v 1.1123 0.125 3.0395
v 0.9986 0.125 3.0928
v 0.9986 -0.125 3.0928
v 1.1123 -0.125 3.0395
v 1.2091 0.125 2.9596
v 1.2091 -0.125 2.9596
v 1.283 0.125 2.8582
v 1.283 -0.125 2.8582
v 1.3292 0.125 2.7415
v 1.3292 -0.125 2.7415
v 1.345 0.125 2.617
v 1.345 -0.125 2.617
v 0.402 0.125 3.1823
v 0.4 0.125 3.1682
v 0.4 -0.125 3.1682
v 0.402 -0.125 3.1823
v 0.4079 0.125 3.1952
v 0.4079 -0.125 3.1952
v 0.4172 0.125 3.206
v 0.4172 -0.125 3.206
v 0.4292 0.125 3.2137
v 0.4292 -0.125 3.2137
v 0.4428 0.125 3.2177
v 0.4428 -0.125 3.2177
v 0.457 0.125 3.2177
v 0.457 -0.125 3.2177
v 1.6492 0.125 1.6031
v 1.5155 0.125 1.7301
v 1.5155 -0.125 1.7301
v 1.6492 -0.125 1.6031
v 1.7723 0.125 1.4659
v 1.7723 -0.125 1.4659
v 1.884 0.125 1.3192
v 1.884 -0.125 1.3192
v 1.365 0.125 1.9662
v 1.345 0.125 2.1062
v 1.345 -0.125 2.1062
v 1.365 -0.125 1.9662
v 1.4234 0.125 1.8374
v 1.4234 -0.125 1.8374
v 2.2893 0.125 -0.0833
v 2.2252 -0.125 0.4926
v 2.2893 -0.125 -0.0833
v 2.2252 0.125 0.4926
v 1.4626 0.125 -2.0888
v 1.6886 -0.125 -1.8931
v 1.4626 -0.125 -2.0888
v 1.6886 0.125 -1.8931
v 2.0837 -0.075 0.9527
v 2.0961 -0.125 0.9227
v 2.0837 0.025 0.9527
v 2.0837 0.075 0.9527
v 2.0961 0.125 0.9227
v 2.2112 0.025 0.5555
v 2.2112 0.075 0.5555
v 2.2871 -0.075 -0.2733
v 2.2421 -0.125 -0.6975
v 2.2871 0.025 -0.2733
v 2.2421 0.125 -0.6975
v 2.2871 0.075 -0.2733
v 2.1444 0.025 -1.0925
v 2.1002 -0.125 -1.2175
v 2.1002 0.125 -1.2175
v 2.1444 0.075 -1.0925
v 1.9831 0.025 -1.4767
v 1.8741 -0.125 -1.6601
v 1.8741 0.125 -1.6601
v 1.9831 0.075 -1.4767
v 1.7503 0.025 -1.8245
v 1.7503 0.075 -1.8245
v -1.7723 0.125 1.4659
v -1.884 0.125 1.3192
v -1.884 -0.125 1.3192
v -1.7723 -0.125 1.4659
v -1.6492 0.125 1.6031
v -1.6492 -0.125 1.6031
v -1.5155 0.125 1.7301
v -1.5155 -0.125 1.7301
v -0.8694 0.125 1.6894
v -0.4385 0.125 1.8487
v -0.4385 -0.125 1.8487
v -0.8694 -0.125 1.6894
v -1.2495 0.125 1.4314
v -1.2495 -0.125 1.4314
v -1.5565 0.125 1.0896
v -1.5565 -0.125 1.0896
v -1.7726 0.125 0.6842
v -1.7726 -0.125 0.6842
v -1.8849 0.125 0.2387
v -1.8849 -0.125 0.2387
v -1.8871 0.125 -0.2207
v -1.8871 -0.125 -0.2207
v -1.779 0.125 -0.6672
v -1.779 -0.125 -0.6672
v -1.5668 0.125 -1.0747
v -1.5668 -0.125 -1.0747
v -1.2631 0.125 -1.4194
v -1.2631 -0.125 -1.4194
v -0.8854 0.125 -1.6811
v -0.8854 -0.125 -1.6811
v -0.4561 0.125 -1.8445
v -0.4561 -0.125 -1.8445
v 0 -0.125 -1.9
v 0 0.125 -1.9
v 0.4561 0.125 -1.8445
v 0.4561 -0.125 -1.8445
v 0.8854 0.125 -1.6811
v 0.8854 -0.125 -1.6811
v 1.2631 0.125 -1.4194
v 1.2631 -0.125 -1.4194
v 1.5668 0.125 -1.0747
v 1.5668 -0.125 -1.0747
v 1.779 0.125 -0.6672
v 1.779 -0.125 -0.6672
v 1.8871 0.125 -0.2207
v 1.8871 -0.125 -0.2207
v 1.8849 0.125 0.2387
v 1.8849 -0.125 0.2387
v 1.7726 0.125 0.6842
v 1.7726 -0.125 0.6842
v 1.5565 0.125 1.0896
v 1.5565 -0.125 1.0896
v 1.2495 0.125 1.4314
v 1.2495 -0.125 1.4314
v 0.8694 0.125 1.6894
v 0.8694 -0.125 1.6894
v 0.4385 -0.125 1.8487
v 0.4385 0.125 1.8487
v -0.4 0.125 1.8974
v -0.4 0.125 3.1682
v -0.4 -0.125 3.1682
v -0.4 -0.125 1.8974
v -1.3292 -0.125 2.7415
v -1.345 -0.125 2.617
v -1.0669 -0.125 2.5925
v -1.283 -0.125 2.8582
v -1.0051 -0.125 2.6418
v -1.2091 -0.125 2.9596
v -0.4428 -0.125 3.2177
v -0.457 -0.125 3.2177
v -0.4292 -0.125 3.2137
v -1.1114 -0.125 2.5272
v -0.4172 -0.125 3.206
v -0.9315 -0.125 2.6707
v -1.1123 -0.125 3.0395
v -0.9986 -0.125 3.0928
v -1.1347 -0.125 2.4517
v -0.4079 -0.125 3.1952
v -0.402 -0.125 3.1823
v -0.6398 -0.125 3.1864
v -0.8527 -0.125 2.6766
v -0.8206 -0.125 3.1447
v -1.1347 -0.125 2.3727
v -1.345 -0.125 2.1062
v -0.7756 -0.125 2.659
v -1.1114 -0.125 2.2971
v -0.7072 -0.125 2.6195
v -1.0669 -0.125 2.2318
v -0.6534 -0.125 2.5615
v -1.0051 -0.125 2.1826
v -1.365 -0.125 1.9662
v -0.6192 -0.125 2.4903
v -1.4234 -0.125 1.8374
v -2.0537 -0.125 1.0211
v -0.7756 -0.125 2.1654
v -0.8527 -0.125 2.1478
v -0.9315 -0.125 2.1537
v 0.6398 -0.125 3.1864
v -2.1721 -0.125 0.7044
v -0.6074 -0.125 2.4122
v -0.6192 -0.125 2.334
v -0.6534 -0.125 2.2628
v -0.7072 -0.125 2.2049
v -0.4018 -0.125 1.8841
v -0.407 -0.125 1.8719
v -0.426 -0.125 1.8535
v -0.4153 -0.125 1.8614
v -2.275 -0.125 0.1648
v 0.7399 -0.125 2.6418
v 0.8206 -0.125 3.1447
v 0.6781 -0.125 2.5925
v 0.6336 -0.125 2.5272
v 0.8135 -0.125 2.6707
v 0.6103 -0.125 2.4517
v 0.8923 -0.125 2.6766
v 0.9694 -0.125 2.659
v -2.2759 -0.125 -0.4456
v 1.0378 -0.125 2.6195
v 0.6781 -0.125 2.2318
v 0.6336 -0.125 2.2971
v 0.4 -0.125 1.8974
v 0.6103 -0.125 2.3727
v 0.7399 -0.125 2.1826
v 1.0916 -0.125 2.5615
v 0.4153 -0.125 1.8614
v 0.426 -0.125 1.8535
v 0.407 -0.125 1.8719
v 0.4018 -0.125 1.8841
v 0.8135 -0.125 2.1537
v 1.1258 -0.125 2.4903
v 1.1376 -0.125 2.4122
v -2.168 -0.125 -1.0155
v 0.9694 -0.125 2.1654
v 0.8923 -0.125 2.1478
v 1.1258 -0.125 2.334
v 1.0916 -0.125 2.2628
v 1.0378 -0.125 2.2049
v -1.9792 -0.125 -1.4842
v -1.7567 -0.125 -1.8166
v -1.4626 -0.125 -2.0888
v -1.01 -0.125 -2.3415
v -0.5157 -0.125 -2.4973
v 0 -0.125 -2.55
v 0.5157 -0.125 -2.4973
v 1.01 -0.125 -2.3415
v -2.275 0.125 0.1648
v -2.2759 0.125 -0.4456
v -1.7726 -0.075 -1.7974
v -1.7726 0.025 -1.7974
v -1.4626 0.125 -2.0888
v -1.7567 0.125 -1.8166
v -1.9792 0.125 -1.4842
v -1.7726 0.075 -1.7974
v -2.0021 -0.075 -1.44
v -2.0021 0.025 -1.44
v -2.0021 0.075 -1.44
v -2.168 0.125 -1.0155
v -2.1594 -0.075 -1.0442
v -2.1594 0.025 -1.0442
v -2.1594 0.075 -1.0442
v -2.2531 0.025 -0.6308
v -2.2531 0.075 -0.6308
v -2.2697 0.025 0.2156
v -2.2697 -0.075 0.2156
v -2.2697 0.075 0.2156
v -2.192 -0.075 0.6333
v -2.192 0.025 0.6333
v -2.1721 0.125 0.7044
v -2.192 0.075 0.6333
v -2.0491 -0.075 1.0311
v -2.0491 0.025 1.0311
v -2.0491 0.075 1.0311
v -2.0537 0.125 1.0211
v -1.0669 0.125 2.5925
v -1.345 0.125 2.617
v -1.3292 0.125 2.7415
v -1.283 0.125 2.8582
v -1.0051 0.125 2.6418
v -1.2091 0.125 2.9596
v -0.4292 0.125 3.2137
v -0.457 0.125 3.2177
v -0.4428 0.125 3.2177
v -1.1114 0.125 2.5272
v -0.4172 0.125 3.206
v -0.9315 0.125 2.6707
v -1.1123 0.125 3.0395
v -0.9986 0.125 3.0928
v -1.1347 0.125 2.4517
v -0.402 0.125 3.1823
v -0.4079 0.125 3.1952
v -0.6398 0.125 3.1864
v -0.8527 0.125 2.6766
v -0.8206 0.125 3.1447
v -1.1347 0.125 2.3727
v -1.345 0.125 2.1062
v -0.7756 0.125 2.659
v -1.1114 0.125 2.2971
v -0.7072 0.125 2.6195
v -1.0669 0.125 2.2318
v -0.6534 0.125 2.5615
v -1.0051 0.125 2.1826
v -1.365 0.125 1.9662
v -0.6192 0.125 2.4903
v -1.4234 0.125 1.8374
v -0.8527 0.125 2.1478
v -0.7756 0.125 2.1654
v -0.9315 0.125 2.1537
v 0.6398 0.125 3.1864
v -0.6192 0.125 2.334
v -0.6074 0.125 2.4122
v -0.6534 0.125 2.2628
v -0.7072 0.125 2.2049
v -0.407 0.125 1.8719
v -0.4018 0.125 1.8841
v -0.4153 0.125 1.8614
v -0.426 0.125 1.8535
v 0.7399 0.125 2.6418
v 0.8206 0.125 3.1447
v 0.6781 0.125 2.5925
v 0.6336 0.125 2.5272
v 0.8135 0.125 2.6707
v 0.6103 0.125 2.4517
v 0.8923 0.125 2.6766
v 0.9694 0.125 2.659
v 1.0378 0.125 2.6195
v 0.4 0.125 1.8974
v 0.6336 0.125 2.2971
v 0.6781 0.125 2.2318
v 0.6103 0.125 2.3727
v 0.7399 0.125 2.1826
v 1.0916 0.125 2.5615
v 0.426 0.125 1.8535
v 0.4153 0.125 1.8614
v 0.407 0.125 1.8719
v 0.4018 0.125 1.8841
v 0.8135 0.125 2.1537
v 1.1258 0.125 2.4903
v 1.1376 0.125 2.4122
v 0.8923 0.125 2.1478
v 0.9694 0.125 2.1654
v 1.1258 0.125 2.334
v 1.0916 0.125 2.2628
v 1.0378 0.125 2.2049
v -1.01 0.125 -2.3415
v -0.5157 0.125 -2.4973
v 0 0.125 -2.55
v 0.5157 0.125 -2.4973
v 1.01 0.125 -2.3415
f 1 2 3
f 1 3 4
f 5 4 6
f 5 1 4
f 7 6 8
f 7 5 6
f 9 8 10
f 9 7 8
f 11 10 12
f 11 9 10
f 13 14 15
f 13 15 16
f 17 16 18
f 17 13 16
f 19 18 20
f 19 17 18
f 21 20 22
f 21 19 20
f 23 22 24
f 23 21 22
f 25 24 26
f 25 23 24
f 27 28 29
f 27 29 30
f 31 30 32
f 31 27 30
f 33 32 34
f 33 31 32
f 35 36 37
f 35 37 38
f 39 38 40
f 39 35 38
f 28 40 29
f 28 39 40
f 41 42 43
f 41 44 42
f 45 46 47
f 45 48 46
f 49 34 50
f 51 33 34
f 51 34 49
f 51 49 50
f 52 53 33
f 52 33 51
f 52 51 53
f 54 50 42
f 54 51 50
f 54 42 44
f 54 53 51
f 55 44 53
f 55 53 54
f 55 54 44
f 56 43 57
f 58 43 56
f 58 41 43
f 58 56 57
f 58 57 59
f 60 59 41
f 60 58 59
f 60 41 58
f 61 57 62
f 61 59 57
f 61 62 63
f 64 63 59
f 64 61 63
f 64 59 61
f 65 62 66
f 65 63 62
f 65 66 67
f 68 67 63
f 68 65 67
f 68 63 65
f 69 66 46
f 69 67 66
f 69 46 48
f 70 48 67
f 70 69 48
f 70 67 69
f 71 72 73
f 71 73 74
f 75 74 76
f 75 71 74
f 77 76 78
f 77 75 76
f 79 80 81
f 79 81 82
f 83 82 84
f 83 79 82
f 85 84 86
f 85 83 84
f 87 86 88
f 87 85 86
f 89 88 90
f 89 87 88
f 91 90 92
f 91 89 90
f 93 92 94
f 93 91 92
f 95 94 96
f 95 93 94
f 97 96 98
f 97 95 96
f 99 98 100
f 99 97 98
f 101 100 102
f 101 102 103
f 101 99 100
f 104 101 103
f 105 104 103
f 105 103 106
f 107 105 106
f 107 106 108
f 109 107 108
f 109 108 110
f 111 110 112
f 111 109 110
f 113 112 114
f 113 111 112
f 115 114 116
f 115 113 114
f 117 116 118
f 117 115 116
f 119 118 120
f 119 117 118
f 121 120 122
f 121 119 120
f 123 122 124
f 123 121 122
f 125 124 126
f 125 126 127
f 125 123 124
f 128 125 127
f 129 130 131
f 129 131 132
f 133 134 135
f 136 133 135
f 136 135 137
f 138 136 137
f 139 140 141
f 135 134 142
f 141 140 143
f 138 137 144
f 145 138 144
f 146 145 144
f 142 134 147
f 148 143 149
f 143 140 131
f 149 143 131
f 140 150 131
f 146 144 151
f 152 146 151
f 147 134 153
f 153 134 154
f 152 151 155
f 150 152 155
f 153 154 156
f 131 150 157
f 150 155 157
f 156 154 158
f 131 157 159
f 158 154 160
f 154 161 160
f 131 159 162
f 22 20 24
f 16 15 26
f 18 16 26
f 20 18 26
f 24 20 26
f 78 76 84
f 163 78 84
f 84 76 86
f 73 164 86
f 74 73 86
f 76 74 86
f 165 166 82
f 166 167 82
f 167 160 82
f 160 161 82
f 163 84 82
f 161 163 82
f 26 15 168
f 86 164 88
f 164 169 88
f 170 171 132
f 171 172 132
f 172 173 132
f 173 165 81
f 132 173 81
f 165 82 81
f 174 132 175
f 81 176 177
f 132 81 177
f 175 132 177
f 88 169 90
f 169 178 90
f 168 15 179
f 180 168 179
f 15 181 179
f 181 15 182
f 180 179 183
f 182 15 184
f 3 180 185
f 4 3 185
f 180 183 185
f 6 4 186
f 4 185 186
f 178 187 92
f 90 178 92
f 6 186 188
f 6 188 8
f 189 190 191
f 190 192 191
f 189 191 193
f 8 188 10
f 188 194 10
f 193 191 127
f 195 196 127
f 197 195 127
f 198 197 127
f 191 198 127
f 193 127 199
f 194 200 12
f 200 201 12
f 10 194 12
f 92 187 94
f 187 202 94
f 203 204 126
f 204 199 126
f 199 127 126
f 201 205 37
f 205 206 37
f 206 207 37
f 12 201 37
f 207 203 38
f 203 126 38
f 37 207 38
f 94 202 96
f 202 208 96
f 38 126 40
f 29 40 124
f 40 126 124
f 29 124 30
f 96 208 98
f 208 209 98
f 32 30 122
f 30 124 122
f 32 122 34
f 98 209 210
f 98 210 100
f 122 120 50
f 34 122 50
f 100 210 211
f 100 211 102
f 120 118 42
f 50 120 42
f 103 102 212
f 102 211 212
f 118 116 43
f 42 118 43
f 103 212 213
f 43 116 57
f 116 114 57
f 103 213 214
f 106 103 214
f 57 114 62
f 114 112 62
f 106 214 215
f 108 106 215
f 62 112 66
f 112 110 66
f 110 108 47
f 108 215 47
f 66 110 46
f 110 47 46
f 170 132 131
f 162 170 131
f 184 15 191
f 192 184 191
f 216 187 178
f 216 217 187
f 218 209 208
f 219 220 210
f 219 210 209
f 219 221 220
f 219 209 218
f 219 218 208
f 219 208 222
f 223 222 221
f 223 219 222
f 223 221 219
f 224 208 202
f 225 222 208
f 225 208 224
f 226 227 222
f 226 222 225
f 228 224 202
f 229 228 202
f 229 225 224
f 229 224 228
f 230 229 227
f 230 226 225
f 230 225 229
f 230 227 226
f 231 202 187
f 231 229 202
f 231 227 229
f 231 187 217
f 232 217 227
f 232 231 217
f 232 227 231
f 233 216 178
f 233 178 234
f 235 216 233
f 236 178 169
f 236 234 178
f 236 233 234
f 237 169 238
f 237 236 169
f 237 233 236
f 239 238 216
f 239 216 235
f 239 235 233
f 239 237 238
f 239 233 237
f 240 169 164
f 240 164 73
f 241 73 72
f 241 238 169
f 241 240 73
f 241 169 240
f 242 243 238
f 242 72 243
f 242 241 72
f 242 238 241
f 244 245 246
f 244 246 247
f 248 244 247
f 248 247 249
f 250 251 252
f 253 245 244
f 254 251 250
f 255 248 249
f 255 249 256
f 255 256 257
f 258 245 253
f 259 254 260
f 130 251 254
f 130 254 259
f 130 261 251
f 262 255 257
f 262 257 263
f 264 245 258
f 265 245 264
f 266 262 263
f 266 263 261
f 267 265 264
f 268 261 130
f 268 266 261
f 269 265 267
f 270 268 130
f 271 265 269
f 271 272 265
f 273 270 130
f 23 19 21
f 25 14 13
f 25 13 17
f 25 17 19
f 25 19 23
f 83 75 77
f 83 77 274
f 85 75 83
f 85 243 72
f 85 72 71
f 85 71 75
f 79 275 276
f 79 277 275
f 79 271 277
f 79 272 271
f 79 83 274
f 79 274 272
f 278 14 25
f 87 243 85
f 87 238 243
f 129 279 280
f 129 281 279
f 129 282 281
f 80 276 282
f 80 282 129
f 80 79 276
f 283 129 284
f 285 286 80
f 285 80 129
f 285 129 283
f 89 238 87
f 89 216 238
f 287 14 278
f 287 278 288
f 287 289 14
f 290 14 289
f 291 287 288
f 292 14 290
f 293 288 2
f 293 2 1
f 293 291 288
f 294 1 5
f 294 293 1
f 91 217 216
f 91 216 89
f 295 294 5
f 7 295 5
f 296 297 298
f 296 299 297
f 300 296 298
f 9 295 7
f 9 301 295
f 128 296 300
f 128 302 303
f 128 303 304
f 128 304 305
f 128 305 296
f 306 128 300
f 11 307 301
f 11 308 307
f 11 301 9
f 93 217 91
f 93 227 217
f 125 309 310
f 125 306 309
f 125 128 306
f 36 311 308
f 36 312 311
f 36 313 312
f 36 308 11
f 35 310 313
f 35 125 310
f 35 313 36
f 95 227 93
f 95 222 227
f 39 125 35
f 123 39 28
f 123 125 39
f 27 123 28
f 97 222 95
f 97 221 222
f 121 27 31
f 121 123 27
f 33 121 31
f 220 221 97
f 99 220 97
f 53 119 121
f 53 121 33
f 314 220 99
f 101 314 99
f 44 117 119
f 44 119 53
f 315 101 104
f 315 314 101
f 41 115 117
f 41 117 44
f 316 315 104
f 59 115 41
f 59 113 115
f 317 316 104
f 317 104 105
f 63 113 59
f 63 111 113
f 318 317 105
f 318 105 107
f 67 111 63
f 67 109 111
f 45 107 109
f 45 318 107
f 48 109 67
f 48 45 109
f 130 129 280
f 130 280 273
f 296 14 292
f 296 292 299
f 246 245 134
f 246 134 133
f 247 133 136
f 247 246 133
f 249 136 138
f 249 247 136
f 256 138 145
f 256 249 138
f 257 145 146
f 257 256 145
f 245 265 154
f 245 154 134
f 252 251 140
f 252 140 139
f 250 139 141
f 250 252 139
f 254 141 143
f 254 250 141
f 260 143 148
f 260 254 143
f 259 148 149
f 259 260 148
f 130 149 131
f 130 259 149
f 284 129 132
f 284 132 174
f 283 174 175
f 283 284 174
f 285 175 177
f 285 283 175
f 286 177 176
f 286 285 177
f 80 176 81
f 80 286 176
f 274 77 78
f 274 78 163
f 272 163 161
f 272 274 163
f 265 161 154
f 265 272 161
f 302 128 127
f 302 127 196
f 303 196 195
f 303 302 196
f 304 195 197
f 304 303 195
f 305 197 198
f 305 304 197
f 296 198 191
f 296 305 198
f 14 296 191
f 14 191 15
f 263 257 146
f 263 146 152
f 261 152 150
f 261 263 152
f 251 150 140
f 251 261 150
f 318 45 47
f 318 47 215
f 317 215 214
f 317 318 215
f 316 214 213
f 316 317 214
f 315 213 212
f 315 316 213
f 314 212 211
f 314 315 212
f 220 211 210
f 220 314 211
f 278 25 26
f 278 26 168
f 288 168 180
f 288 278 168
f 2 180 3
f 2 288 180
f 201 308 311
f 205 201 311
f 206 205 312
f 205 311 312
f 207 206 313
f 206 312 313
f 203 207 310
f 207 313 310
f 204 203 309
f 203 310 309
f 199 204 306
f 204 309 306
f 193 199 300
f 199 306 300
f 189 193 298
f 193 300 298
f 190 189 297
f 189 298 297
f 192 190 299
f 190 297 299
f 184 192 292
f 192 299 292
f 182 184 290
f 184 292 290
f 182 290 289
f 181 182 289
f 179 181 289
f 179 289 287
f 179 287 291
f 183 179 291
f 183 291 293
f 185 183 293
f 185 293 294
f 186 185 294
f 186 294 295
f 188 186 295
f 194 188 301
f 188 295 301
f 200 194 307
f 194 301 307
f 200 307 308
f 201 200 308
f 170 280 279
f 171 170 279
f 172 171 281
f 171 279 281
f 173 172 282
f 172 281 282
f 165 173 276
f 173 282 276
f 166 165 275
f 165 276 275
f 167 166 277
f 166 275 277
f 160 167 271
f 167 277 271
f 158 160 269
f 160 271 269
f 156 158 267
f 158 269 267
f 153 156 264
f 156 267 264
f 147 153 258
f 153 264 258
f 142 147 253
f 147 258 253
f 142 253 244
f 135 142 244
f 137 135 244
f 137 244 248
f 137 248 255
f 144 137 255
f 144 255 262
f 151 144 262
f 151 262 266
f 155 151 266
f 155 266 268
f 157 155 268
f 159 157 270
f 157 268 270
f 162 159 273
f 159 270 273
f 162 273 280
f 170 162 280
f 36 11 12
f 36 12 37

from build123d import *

# Parameters (mm, degrees)
SCHIZZO1_R                   = 0.265127494
ESTRUSIONE_ESTRUSIONE1_DEPTH = 0.25


with BuildPart() as part:
    # Schizzo1 → Estrusione-Estrusione1 (new body)
    with BuildSketch(Plane(origin=(0, 0.125, 0), x_dir=(1, 0, 0), z_dir=(0, 1, 0))):
        with BuildLine():
            Line((-0.4, -3.168201382), (-0.4, -1.897366596))
            ThreePointArc((-0.4, -1.897366596), (-0.410776773, -1.866357912), (-0.438461538, -1.848716171))
            ThreePointArc((-0.438461538, -1.848716171), (0, 1.9), (0.438461538, -1.848716171))
            ThreePointArc((0.438461538, -1.848716171), (0.410776773, -1.866357912), (0.4, -1.897366596))
            Line((0.4, -1.897366596), (0.4, -3.168201382))
            ThreePointArc((0.4, -3.168201382), (0.417224723, -3.205960901), (0.45703125, -3.217704529))
            ThreePointArc((0.45703125, -3.217704529), (0.730509561, -3.166836873), (0.998636364, -3.092769861))
            ThreePointArc((0.998636364, -3.092769861), (1.249238903, -2.911222446), (1.345, -2.616959113))
            Line((1.345, -2.616959113), (1.345, -2.106175444))
            ThreePointArc((1.345, -2.106175444), (1.38962535, -1.899695594), (1.515535714, -1.730072686))
            ThreePointArc((1.515535714, -1.730072686), (1.712160635, -1.535742804), (1.884049702, -1.319225804))
            add(Edge.make_bspline(
                [(1.884049702, -1.319225804), (2.019028975, -1.126455424), (2.115110162, -0.904375316), (2.179460327, -0.678015249), (2.270153104, -0.358991622), (2.302501228, -0.019899245), (2.285387374, 0.311323295), (2.26784312, 0.650875841), (2.197551078, 0.994363091), (2.063917418, 1.307006302), (1.984645052, 1.492468311), (1.88078204, 1.670669807), (1.750288587, 1.824460975), (1.666028558, 1.923764412), (1.569301455, 2.014138493), (1.462619913, 2.088837713)],
                knots=[0, 0, 0, 0, 0.000705988, 0.000705988, 0.000705988, 0.001703524, 0.001703524, 0.001703524, 0.002727653, 0.002727653, 0.002727653, 0.003330782, 0.003330782, 0.003330782, 0.0037183, 0.0037183, 0.0037183, 0.0037183], degree=3))
            ThreePointArc((1.462619913, 2.088837713), (0, 2.55), (-1.462619913, 2.088837713))
            add(Edge.make_bspline(
                [(-1.462619913, 2.088837713), (-1.615530694, 1.981768431), (-1.747869333, 1.842005153), (-1.854500953, 1.688788849), (-1.995460269, 1.486247938), (-2.097780092, 1.254601869), (-2.167328588, 1.017841745), (-2.264449586, 0.68721807), (-2.302378714, 0.335122463), (-2.286139342, -0.009087917), (-2.269658272, -0.358421336), (-2.196778774, -0.714119474), (-2.049077035, -1.031120515), (-2.002334914, -1.131439586), (-1.947529721, -1.228566942), (-1.884049702, -1.319225804)],
                knots=[0, 0, 0, 0, 0.000560009, 0.000560009, 0.000560009, 0.001300888, 0.001300888, 0.001300888, 0.002338839, 0.002338839, 0.002338839, 0.003395612, 0.003395612, 0.003395612, 0.003723988, 0.003723988, 0.003723988, 0.003723988], degree=3))
            ThreePointArc((-1.884049702, -1.319225804), (-1.712160635, -1.535742804), (-1.515535714, -1.730072686))
            ThreePointArc((-1.515535714, -1.730072686), (-1.38962535, -1.899695594), (-1.345, -2.106175444))
            Line((-1.345, -2.106175444), (-1.345, -2.616959113))
            ThreePointArc((-1.345, -2.616959113), (-1.249238903, -2.911222446), (-0.998636364, -3.092769861))
            ThreePointArc((-0.998636364, -3.092769861), (-0.730509561, -3.166836873), (-0.45703125, -3.217704529))
            ThreePointArc((-0.45703125, -3.217704529), (-0.417224723, -3.205960901), (-0.4, -3.168201382))
        make_face()
        with Locations((0.8725, -2.412182168)):
            Circle(SCHIZZO1_R, mode=Mode.SUBTRACT)
        with Locations((-0.8725, -2.412182168)):
            Circle(SCHIZZO1_R, mode=Mode.SUBTRACT)
    extrude(amount=-ESTRUSIONE_ESTRUSIONE1_DEPTH)


solid = part.part
